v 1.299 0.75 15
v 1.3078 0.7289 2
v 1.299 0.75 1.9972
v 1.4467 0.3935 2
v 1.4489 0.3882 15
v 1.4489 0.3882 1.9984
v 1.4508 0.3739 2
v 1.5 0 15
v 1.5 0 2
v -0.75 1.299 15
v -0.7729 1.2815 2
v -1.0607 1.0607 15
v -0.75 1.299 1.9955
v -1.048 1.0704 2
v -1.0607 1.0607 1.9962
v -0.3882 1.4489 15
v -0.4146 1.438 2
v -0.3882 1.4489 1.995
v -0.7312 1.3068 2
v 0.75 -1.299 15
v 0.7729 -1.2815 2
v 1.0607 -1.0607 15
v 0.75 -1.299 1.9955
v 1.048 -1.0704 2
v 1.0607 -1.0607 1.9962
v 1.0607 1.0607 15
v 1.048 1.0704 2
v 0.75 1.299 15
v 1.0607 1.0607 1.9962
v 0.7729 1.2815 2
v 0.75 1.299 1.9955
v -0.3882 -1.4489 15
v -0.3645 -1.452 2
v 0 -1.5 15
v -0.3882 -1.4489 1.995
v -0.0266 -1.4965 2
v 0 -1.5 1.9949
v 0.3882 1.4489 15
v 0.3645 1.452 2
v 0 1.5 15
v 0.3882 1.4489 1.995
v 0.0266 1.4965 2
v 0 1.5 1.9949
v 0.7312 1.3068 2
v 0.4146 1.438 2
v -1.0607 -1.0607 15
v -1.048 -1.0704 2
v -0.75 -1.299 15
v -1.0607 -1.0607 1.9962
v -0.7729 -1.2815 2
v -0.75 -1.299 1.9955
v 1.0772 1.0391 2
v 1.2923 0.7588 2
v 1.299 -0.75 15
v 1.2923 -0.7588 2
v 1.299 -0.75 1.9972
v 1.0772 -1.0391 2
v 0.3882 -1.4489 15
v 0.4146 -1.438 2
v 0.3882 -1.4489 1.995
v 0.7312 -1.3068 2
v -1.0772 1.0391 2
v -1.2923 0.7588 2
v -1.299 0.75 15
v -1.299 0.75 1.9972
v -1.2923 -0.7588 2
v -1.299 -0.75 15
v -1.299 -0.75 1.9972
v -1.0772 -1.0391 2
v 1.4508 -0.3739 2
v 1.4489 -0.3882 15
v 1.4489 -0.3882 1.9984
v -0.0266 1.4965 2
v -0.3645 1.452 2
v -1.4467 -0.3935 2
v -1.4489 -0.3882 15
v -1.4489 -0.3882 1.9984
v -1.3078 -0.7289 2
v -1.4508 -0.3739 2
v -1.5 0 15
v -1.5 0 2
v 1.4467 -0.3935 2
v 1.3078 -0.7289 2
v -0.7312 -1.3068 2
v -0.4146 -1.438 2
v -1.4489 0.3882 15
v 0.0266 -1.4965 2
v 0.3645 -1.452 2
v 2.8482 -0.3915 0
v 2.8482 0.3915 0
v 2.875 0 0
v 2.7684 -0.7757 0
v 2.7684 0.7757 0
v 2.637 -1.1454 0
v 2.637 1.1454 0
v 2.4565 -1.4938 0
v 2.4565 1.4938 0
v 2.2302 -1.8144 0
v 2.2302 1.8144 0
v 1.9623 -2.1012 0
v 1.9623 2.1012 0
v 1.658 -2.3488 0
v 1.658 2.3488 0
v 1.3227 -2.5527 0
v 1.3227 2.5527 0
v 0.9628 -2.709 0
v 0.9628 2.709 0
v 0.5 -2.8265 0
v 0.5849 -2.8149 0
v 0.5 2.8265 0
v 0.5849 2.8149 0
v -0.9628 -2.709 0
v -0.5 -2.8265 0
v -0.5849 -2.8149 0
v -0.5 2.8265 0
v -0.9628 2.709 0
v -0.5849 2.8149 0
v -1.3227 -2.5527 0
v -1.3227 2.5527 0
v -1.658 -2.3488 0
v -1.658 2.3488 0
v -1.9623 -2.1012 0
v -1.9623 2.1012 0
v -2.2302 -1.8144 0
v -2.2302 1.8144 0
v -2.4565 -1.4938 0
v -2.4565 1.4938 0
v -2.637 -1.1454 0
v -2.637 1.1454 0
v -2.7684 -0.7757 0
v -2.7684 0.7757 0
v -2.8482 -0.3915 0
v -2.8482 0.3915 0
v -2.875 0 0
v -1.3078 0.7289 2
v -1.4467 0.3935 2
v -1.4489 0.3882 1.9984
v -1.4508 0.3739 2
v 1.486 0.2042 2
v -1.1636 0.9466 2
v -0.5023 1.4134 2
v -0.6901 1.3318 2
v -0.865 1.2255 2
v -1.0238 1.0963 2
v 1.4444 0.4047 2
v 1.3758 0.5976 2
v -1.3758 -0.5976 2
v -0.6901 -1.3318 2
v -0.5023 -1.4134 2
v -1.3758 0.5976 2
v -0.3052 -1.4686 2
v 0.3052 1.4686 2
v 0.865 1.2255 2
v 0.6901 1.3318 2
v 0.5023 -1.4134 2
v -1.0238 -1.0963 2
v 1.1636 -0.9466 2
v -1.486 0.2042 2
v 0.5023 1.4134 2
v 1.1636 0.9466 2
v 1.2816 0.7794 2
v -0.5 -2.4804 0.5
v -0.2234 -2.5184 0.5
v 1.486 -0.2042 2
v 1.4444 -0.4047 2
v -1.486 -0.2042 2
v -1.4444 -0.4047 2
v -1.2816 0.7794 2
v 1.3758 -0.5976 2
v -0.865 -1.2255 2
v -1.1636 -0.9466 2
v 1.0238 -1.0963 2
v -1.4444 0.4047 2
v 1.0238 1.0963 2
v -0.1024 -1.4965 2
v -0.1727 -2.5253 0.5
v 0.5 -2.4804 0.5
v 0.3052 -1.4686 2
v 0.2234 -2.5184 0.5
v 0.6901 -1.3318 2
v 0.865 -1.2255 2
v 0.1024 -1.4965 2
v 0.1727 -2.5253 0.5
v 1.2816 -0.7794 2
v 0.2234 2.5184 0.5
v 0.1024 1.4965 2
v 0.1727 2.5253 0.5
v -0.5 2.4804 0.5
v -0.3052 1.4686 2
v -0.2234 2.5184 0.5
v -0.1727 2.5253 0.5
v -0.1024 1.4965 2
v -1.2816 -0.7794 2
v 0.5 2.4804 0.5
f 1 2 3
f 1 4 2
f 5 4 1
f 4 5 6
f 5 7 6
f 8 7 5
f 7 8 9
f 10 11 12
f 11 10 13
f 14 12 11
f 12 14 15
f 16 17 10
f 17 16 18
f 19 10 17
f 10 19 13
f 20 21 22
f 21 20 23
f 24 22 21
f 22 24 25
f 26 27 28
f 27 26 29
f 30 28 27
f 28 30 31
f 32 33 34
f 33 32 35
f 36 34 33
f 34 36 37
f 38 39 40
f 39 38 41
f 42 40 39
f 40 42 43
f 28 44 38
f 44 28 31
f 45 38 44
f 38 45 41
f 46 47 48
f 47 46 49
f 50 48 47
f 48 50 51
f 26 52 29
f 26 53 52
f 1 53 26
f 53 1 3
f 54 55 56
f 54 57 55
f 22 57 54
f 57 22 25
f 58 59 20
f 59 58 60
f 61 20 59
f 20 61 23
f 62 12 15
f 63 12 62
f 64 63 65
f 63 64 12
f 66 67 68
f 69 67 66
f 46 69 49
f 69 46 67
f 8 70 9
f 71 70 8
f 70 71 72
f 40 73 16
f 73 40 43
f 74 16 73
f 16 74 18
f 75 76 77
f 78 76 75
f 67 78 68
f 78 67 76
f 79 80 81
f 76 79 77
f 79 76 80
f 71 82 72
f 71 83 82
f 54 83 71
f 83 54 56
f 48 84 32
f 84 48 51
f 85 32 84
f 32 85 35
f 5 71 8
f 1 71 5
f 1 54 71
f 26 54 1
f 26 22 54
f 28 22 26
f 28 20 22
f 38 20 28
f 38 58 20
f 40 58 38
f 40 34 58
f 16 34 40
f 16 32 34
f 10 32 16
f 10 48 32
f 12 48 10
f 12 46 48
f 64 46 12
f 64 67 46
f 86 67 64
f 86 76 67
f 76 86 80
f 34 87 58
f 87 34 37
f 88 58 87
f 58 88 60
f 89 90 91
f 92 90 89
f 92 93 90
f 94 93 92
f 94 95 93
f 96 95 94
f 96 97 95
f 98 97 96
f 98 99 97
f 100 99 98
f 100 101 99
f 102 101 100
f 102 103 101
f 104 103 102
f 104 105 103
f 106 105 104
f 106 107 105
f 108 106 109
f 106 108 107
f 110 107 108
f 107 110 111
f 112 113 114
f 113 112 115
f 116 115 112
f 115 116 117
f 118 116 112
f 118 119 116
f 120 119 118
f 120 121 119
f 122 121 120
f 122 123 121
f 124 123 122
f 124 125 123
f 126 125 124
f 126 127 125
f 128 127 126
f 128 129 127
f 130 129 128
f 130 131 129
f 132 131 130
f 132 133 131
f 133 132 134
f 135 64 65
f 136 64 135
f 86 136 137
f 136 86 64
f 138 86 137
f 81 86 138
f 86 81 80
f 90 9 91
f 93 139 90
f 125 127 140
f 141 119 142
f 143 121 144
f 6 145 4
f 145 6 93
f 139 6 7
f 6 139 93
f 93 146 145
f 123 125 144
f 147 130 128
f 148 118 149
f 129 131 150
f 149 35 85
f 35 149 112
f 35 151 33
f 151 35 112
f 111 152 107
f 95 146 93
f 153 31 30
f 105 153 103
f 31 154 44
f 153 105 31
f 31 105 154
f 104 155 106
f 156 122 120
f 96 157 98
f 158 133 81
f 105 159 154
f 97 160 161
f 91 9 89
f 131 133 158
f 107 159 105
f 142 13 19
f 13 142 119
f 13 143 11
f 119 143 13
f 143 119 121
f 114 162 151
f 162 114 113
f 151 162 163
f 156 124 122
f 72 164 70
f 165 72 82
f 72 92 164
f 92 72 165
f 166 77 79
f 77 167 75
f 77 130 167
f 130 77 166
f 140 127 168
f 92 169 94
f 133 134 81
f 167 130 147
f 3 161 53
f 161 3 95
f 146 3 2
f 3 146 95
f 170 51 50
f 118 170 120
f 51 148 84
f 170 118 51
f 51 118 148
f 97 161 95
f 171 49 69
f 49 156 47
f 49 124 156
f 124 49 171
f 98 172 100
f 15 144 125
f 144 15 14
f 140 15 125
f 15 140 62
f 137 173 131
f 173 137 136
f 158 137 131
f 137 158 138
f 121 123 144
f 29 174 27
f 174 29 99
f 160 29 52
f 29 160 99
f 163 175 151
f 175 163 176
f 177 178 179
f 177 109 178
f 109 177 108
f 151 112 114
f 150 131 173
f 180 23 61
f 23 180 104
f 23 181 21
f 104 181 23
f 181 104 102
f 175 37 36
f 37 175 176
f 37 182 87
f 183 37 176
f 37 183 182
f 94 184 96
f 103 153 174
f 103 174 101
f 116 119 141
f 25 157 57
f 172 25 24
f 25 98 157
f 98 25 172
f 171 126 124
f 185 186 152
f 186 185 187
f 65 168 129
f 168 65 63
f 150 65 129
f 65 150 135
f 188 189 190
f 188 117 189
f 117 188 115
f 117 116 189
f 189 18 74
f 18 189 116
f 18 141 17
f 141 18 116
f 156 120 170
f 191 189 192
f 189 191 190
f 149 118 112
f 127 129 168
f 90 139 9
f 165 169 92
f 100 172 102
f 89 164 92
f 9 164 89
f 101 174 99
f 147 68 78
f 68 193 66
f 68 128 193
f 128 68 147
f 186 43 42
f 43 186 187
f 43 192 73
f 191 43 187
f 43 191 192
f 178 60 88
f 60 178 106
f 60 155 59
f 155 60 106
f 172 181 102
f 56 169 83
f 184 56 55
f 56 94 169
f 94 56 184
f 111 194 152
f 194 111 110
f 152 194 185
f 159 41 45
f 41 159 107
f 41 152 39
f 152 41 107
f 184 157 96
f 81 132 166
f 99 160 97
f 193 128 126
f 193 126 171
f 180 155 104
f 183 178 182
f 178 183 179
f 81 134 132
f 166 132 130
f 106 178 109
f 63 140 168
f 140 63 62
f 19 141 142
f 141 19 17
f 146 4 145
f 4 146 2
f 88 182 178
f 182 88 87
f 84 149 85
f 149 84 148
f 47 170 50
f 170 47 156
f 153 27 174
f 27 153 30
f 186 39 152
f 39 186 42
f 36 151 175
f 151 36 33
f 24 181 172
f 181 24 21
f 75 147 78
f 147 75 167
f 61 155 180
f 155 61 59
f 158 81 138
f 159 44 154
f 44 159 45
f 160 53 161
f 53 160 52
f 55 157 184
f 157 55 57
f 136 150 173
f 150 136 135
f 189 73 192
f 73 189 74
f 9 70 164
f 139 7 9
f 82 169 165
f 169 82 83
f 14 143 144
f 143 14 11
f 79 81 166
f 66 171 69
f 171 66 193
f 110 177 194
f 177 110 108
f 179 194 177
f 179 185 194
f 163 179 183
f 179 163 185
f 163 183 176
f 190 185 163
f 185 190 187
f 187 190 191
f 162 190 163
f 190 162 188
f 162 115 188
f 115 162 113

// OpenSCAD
// file: conical_screw.scad
/**
	Creates a conical screw with the desired lenght and diameter.
	Default diameter is for default M3 screws, widely used on any arduino project.
**/
module conical_screw(screw_lenght = 20, screw_diameter = 3) {
	
	head_diameter = screw_diameter + 2.75;
	difference() {
		
		union() {
			cylinder(h = screw_lenght, r = screw_diameter / 2); // Screw body

			cylinder(2, head_diameter / 2, screw_diameter / 2); // Screw head
		}
		
		cube([1, head_diameter*1.1, 1], true);
	}
}
// file: arduino_uno.scad
board_lenght = 53;
board_wide = 69.5;
board_thick = 1.7;

screw_hole_r = 1.5;

module screw_hole() {
	cylinder(h = 3, r = screw_hole_r);
}

module arduino_uno_board() {
	union() {

		// Circuit board
		difference() {
			cube([board_wide, board_lenght, board_thick]); // Base board

			// Remove the screw holes
			translate([15, 3.5, -0.5])
				screw_hole();
			translate([15, 49.3, -0.5])
				screw_hole();
			translate([66, 35, -0.5])
				screw_hole();
			translate([66, 7, -0.5])
				screw_hole();
			
			// Small hole top right
			translate([65.8, 37.5, -0.5])
				difference() { 
					cube([5, 20.5, 2.5]);

					translate([0, -4, -0.5])
						rotate([0, 0, 45])
							cube(6);
				}
		}

		// USB A port
		translate([-6, 32.2, board_thick-0.1])
			cube([16.4, 12, 10.7]);
		
		// Power supply
		translate([-2, 4, 0])
			cube([13.5, 9, 12.5]);
	}
}
// main file
include <arduino_uno.scad>
use <conical_screw.scad>

$fa = 1;
$fs = 0.4;

*arduino_uno_board();

conical_screw(screw_lenght = 15);
